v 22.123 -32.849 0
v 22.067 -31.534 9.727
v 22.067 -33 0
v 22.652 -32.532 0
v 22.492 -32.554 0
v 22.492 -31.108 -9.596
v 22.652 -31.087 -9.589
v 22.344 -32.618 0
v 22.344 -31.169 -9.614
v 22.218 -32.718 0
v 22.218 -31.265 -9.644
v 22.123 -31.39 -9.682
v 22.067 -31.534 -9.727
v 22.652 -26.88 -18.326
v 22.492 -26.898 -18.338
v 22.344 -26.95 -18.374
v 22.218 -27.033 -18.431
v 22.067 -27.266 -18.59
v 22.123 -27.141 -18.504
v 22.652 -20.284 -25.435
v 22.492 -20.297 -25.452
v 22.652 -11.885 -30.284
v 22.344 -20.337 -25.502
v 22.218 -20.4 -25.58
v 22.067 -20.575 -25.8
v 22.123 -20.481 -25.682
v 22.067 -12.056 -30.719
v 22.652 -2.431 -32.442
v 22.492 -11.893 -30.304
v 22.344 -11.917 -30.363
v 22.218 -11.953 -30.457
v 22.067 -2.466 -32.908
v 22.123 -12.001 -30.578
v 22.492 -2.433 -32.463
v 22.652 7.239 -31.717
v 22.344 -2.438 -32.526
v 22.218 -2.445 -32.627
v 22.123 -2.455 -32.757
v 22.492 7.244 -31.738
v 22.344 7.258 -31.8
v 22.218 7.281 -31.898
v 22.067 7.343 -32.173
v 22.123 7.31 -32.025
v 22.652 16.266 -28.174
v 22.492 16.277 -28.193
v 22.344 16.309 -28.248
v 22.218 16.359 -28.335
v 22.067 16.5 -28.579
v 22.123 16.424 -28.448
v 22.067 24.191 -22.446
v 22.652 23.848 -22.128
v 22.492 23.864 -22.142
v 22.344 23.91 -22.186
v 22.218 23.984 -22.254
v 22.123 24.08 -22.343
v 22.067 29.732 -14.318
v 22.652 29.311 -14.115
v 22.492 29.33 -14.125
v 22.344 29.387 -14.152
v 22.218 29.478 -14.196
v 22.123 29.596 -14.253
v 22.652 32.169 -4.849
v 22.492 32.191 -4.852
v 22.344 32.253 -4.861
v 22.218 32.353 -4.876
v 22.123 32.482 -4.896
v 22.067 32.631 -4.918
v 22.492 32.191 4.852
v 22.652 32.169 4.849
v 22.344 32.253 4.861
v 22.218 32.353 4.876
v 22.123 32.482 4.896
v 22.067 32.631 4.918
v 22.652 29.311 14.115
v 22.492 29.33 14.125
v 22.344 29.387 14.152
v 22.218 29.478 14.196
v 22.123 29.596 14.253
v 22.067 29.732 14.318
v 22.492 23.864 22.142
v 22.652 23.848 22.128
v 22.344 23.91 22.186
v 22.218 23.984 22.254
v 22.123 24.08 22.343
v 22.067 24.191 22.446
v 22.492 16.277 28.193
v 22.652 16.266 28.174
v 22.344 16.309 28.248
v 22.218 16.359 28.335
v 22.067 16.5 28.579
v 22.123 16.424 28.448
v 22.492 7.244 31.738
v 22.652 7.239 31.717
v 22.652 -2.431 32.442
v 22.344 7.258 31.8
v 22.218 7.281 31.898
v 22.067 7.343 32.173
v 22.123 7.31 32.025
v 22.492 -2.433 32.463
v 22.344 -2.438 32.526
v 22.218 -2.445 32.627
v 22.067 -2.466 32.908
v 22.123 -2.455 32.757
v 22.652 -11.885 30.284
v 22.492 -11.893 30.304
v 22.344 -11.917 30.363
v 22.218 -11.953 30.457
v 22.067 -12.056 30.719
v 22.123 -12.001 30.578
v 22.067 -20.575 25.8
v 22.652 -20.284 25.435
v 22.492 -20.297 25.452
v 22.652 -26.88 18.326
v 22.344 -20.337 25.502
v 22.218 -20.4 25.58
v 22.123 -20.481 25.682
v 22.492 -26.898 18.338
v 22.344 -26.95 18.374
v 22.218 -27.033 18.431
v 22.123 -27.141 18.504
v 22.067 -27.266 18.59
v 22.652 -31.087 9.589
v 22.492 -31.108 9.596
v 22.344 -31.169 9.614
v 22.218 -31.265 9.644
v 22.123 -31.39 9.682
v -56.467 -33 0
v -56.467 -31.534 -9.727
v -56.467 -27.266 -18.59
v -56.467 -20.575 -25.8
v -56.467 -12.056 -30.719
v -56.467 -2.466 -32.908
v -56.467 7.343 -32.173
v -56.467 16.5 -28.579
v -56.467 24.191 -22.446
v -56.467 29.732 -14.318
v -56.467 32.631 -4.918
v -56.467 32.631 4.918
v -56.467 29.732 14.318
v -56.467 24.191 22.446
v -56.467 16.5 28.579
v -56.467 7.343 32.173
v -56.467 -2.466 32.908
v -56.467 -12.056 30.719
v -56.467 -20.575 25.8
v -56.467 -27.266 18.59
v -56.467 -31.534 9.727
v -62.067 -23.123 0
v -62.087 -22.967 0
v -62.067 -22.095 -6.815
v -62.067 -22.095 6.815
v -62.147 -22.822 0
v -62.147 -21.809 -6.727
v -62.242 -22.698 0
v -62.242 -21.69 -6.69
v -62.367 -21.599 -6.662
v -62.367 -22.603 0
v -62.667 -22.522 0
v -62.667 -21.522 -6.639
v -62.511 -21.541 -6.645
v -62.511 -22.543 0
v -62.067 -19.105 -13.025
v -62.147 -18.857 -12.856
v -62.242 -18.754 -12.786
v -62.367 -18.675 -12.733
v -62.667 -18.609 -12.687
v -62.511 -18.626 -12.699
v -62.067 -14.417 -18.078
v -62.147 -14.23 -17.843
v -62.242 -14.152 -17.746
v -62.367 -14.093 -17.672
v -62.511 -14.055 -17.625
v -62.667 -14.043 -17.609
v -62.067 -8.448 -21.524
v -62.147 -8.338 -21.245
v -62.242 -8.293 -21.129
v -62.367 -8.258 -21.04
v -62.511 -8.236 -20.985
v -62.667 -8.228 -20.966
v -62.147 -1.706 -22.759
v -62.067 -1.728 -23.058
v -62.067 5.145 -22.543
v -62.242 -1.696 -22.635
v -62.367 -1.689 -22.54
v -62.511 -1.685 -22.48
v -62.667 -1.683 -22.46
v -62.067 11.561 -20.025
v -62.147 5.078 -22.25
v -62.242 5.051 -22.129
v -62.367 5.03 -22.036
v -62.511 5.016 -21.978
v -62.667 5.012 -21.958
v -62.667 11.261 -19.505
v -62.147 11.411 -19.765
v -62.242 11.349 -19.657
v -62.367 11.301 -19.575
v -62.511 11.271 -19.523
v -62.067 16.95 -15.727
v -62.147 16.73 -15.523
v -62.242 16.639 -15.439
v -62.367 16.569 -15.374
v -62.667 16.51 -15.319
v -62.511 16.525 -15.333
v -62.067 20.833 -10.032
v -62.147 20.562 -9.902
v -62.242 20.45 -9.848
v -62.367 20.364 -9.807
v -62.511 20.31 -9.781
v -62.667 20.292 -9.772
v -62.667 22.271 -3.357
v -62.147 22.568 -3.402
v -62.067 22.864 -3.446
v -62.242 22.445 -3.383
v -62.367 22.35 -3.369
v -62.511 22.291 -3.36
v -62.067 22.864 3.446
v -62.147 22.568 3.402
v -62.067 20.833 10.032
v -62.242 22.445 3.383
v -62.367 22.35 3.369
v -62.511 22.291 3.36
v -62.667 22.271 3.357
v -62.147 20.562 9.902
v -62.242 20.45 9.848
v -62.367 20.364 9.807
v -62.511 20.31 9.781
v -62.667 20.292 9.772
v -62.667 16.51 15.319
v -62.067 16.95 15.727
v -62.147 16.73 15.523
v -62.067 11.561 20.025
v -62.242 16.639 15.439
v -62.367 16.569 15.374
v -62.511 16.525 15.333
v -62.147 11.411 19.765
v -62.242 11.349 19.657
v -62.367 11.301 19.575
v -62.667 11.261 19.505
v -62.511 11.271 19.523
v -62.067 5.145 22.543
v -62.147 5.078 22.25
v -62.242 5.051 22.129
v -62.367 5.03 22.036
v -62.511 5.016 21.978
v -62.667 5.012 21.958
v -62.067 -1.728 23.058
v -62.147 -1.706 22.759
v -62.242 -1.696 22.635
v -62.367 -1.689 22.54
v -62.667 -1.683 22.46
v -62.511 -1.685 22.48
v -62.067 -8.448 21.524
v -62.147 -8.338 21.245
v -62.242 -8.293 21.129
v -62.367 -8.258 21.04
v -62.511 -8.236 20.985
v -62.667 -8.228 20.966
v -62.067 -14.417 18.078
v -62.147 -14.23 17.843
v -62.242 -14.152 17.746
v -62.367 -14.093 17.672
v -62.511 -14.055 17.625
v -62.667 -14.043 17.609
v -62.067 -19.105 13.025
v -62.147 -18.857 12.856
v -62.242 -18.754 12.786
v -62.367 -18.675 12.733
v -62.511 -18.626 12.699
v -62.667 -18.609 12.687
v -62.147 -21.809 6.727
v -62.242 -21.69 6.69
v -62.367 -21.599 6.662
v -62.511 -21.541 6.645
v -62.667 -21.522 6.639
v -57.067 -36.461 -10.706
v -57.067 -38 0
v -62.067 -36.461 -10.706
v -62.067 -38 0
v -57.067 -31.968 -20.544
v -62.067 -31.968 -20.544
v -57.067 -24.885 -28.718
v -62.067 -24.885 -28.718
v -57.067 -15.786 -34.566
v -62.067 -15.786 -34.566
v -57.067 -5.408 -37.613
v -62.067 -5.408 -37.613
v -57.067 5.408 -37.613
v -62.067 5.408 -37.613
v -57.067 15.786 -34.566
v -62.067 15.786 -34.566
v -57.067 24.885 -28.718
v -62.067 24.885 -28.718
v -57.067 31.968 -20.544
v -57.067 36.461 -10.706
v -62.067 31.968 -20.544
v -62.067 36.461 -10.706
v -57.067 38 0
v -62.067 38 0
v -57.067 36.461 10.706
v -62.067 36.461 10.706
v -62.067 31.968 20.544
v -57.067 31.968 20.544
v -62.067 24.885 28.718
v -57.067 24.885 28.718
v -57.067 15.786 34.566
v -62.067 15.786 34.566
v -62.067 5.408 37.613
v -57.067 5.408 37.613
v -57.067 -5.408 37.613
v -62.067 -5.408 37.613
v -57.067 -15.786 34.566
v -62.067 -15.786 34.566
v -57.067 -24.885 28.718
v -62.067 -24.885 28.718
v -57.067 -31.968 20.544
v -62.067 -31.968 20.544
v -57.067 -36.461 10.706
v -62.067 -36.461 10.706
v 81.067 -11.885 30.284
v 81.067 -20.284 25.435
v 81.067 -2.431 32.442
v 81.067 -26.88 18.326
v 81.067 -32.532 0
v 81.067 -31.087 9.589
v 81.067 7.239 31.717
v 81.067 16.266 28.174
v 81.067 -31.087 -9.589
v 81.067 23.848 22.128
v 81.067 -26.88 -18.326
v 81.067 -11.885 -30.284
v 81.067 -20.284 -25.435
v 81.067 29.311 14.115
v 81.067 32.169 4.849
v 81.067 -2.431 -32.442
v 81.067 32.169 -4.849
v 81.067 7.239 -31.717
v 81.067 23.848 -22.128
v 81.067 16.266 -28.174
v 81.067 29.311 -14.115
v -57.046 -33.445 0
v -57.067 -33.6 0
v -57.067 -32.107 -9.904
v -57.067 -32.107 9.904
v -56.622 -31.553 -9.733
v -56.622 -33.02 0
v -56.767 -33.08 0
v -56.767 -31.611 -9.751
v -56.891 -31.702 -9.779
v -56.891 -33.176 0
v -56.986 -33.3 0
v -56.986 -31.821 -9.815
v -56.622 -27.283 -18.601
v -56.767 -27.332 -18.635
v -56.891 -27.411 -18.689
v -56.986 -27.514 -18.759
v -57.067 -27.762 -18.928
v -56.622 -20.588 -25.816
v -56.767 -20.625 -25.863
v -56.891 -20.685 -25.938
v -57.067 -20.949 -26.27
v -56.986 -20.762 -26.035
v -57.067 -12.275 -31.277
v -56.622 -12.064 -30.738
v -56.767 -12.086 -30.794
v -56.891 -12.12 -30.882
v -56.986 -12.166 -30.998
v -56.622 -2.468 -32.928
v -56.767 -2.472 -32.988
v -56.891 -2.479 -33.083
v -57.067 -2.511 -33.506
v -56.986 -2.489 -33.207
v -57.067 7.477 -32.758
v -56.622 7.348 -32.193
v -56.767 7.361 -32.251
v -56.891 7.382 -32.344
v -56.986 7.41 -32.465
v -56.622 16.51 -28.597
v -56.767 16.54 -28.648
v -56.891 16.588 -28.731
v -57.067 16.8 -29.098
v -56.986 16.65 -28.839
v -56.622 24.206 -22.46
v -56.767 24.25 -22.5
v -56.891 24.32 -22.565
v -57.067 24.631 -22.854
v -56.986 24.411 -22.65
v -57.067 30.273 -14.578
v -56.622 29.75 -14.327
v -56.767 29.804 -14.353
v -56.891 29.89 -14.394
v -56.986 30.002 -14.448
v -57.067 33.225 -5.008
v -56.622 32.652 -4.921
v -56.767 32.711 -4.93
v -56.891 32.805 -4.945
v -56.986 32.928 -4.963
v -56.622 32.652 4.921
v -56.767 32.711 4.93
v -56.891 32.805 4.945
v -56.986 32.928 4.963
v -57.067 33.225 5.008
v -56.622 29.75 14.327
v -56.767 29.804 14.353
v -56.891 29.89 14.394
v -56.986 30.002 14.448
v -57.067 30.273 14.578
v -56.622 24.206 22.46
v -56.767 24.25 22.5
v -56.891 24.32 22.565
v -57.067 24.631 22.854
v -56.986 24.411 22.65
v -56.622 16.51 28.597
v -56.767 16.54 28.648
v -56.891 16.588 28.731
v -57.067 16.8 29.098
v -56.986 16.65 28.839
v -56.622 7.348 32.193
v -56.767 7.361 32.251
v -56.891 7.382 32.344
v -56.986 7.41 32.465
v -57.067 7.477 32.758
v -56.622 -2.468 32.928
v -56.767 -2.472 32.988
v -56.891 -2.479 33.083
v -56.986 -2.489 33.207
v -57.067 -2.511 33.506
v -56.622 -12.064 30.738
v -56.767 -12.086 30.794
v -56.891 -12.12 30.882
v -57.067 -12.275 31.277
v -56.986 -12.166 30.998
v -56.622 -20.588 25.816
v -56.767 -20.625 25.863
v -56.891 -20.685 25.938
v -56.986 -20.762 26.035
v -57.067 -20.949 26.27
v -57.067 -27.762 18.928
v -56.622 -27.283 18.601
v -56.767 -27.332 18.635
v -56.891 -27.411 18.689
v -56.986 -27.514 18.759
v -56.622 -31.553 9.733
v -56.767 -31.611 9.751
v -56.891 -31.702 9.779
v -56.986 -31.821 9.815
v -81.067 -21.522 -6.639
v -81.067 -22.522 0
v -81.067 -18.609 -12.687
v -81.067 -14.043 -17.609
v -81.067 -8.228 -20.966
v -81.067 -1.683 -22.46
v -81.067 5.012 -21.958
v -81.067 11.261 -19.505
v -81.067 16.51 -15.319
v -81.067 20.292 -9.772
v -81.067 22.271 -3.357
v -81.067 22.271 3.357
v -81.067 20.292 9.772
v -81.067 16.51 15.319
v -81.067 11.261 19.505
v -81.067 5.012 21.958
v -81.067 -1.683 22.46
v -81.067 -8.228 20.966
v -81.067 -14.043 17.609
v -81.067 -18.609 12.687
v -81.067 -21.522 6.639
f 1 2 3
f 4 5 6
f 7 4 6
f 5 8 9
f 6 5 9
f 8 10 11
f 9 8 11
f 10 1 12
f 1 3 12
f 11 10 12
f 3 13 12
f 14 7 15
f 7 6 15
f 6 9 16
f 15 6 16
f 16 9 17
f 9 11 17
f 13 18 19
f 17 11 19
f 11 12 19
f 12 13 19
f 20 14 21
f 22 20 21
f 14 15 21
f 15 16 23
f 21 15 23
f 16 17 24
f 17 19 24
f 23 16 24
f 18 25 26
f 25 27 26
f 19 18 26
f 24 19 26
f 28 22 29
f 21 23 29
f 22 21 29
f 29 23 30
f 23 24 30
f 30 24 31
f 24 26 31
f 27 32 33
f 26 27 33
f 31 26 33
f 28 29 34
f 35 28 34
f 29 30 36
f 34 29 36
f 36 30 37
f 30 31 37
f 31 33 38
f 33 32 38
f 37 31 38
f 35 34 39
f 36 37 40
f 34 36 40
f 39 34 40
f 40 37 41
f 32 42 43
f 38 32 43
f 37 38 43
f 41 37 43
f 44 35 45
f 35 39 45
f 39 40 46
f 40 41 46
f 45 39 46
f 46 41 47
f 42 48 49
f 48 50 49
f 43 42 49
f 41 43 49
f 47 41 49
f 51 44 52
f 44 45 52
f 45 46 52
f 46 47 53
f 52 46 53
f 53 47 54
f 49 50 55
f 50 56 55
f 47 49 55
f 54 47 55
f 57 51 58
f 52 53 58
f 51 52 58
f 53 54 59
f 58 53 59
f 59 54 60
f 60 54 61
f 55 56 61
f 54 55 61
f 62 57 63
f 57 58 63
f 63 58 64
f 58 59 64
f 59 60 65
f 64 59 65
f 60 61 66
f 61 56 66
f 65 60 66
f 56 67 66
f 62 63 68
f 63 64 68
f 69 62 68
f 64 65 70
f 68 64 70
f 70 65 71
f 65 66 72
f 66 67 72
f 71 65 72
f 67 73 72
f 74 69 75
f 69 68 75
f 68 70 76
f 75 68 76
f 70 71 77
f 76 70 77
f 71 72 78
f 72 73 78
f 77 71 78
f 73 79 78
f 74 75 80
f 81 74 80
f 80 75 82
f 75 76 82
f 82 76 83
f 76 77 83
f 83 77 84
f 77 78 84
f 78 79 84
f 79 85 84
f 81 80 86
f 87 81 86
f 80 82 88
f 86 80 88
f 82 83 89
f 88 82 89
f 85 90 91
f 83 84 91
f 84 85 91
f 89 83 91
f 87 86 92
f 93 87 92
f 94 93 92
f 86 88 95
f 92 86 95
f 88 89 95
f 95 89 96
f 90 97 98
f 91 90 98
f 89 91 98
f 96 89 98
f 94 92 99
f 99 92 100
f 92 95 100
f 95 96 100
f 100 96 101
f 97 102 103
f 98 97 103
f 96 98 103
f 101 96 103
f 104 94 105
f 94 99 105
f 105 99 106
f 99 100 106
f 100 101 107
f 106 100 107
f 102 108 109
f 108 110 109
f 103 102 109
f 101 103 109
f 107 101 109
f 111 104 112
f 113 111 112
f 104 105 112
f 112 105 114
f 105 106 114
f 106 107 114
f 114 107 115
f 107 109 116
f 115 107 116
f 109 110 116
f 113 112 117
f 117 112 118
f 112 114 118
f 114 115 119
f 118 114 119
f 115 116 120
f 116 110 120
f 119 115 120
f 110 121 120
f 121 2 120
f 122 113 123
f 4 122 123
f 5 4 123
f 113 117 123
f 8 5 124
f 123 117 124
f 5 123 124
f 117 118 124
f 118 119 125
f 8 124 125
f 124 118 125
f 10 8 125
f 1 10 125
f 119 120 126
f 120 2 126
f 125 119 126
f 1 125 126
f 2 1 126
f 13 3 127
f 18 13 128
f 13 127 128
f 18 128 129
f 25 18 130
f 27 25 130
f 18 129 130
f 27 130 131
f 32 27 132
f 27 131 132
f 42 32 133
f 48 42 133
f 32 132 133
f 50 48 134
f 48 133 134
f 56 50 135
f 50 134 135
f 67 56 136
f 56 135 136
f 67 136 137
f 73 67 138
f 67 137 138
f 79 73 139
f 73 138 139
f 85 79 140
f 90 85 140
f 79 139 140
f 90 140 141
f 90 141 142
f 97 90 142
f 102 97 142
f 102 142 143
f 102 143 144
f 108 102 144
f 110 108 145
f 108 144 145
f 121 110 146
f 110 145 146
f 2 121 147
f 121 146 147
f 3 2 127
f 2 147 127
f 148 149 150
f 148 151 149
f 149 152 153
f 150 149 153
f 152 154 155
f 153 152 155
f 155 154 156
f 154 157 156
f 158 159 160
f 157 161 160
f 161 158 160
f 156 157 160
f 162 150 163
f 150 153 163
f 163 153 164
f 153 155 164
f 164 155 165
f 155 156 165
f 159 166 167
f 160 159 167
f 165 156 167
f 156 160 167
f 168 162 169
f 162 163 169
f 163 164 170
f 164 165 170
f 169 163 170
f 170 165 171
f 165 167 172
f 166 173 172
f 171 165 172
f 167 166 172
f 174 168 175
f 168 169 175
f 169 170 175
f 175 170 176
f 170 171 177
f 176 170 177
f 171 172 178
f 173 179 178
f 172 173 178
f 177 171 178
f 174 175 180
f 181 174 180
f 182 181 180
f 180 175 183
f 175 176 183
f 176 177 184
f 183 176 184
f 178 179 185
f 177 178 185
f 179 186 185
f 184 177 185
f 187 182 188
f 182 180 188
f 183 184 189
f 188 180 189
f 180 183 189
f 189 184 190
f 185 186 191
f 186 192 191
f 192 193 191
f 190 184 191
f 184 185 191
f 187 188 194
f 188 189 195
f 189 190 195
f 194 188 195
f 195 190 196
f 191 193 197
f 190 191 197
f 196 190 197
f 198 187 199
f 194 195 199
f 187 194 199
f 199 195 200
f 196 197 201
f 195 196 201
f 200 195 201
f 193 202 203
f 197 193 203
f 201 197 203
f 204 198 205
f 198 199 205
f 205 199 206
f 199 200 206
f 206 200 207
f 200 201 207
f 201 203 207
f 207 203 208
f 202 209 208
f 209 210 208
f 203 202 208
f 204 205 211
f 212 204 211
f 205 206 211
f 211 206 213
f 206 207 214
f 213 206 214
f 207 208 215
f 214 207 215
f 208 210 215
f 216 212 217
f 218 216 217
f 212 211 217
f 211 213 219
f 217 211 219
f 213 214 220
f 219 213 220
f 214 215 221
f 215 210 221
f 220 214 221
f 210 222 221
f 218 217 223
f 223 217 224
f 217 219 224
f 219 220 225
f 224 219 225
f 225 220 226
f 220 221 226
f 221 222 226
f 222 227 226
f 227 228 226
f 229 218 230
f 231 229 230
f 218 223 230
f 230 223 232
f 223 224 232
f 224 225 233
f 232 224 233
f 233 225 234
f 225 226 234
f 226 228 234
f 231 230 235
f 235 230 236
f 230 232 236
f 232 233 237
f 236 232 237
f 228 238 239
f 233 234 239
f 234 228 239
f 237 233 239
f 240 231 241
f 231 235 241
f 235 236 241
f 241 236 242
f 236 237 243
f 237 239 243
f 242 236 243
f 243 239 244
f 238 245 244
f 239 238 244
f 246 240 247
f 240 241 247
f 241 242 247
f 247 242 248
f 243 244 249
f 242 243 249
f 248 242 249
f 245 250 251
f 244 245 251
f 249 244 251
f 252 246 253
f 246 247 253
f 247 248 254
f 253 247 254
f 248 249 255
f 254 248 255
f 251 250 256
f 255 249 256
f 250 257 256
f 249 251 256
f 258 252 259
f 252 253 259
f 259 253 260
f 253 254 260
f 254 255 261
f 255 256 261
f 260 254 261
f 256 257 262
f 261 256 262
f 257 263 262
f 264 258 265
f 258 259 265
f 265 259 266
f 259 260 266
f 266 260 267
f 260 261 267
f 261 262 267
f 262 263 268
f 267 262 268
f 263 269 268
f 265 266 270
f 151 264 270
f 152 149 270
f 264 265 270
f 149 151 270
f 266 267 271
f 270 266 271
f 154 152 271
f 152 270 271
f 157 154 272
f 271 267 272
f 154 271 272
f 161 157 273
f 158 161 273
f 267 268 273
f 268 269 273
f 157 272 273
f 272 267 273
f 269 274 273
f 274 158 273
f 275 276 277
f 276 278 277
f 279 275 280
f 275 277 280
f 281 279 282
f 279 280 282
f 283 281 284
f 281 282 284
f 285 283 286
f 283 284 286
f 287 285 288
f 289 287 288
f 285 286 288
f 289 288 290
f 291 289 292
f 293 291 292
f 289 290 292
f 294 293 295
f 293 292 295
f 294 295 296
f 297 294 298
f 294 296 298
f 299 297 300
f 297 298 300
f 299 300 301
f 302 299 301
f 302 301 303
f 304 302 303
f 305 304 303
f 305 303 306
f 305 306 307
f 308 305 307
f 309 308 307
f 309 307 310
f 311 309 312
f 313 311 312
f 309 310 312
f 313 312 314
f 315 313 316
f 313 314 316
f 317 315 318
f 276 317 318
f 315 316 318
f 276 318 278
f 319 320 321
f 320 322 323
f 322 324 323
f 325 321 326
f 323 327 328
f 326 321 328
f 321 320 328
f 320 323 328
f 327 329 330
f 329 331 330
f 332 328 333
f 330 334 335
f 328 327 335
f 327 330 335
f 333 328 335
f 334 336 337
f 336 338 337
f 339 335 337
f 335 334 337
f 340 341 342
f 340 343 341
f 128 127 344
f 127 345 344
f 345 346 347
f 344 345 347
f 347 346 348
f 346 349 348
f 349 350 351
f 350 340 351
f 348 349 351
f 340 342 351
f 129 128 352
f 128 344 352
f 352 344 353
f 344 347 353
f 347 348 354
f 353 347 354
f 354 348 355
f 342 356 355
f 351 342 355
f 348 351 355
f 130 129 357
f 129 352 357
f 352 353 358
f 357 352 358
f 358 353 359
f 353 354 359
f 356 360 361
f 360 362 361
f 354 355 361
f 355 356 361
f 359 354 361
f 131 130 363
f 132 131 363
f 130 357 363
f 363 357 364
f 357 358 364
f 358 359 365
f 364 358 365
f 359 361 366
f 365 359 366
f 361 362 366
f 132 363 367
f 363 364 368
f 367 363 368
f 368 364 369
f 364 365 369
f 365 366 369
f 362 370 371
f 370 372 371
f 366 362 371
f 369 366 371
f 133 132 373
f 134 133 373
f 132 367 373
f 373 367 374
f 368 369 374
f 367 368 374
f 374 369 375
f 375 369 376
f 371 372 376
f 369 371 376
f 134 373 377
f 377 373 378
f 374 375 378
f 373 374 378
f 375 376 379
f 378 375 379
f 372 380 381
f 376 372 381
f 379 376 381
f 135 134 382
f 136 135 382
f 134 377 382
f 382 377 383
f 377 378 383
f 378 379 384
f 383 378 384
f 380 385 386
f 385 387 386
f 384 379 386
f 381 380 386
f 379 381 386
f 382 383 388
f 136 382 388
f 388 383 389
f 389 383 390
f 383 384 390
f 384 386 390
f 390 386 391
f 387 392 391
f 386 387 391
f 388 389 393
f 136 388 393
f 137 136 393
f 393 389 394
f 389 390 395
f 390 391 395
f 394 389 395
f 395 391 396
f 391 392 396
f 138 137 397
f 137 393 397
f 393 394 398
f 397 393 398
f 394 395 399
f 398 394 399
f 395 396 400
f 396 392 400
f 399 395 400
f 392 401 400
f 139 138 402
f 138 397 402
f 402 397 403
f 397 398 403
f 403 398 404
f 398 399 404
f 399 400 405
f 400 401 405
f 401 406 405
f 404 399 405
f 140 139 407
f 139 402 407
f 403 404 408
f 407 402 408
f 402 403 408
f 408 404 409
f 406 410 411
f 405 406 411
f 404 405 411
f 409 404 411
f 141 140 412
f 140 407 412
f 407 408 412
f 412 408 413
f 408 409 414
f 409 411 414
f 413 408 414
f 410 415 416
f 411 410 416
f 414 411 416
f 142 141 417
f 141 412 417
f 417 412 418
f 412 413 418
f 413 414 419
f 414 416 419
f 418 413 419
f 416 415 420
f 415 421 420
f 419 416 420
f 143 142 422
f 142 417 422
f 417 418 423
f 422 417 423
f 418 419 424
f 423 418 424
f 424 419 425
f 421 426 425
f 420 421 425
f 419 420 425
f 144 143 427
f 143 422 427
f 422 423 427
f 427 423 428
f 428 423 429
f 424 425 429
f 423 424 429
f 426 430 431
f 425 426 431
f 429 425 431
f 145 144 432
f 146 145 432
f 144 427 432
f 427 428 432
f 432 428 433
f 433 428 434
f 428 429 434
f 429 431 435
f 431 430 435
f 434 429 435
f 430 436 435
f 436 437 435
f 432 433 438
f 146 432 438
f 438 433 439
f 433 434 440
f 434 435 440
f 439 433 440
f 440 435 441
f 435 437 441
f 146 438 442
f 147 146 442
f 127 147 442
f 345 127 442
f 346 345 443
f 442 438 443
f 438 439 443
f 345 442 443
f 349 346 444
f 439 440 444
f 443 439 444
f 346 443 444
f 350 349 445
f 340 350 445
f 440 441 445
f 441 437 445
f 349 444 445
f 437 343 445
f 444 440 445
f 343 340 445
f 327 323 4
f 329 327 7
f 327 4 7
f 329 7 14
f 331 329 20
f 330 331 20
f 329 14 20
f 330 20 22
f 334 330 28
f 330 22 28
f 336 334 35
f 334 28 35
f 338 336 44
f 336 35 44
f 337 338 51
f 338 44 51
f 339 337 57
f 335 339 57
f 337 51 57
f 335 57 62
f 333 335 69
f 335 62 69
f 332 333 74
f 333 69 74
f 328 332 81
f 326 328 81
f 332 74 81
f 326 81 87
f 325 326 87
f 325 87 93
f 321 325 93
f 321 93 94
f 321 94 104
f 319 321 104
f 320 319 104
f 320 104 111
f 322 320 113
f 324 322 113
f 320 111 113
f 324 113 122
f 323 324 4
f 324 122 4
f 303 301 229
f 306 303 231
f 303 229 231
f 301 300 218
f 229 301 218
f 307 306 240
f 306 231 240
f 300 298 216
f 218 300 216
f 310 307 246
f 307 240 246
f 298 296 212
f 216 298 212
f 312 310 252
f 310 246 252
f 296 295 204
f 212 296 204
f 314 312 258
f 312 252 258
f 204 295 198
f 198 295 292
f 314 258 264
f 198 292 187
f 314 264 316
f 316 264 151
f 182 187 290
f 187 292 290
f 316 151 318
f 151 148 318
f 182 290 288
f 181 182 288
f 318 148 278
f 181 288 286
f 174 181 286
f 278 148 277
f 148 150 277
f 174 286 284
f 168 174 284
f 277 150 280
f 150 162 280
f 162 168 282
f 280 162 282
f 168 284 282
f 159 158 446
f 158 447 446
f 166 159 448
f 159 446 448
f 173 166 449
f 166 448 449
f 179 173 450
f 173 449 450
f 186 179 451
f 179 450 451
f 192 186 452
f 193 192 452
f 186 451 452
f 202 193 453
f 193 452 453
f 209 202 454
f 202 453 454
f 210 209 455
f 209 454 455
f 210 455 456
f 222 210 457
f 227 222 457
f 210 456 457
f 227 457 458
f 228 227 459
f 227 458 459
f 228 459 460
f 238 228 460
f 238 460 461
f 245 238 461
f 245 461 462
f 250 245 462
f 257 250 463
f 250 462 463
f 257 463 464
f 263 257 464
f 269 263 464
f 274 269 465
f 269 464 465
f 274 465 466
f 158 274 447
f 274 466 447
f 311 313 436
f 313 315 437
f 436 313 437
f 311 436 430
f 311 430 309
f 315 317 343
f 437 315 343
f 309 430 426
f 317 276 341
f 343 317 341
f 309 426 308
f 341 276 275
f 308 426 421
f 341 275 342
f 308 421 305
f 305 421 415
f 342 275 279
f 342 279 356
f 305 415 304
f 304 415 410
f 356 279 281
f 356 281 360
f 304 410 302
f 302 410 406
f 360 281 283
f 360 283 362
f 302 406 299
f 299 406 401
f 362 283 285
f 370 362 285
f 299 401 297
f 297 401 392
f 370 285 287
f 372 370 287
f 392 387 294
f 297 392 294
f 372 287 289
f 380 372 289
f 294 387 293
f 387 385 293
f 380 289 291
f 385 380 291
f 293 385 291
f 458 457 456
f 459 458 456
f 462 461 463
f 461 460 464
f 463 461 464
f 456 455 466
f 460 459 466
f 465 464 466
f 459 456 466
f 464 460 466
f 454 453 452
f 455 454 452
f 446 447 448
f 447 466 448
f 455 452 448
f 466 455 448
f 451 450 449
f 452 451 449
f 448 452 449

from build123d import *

# Parameters (mm, degrees)
FILLET1_R = 0.6


with BuildPart() as part:
    # Sketch1 → Revolve1 (revolve)
    with BuildSketch(Plane.XY, mode=Mode.PRIVATE) as revolve1_sk:
        Polygon((-81.066688046, 0), (81.066688046, 0), (81.066688046, 32.5325), (40.066688046, 32.5325), (22.066688046, 32.5325), (22.066688046, 33), (-15.469523763, 33), (-57.066688046, 33), (-57.066688046, 38), (-62.066688046, 38), (-62.066688046, 22.5225), (-81.066688046, 22.5225), align=None)
    revolve(revolve1_sk.sketch.rotate(Axis((-122.765721942, 0, 0), (1, 0, 0)), 180), axis=Axis((-122.765721942, 0, 0), (1, 0, 0)))

    # Fillet1
    # the kernel refuses this fillet: 0.6 mm, written as the material it adds along each edge
    with BuildSketch(Plane(origin=(22.066688046, 0, 0), x_dir=(0, -1, 0), z_dir=(0, 0, 1))) as fillet1_piece_1:
        with BuildLine():
            CenterArc((33.1325, 0.585186936), FILLET1_R, 180, 77.242016626)
            Line((33, 0), (32.99735, -0.011703739))
            ThreePointArc((32.99735, -0.011703739), (32.76625, -0.012), (32.5325, -0.012))
            Line((32.5325, -0.012), (32.5205, 0))
            Line((32.5205, 0), (32.5205, 0.585186936))
            Line((32.5205, 0.585186936), (32.5325, 0.585186936))
        make_face()
    revolve(axis=Axis((22.066688046, 0, 0), (1, 0, 0)))
    with BuildSketch(Plane(origin=(-57.066688046, 0, 0), x_dir=(0, -1, 0), z_dir=(0, 0, 1))) as fillet1_piece_2:
        with BuildLine():
            CenterArc((33 + FILLET1_R, FILLET1_R), FILLET1_R, 180, 90)
            Line((33 + FILLET1_R, 0), (33 + FILLET1_R, -FILLET1_R * 0.02))
            Line((33 + FILLET1_R, -FILLET1_R * 0.02), (33 - FILLET1_R * 0.02, -FILLET1_R * 0.02))
            Line((33 - FILLET1_R * 0.02, -FILLET1_R * 0.02), (33 - FILLET1_R * 0.02, FILLET1_R))
            Line((33 - FILLET1_R * 0.02, FILLET1_R), (33, FILLET1_R))
        make_face()
    revolve(axis=Axis((-57.066688046, 0, 0), (1, 0, 0)))
    with BuildSketch(Plane(origin=(-62.066688046, 0, 0), x_dir=(0, -1, 0), z_dir=(0, 0, 1))) as fillet1_piece_3:
        with BuildLine():
            CenterArc((22.5225 + FILLET1_R, -FILLET1_R), FILLET1_R, 90, 90)
            Line((22.5225, -FILLET1_R), (22.5225 - FILLET1_R * 0.02, -FILLET1_R))
            Line((22.5225 - FILLET1_R * 0.02, -FILLET1_R), (22.5225 - FILLET1_R * 0.02, FILLET1_R * 0.02))
            Line((22.5225 - FILLET1_R * 0.02, FILLET1_R * 0.02), (22.5225 + FILLET1_R, FILLET1_R * 0.02))
            Line((22.5225 + FILLET1_R, FILLET1_R * 0.02), (22.5225 + FILLET1_R, 0))
        make_face()
    revolve(axis=Axis((-62.066688046, 0, 0), (1, 0, 0)))


solid = part.part
